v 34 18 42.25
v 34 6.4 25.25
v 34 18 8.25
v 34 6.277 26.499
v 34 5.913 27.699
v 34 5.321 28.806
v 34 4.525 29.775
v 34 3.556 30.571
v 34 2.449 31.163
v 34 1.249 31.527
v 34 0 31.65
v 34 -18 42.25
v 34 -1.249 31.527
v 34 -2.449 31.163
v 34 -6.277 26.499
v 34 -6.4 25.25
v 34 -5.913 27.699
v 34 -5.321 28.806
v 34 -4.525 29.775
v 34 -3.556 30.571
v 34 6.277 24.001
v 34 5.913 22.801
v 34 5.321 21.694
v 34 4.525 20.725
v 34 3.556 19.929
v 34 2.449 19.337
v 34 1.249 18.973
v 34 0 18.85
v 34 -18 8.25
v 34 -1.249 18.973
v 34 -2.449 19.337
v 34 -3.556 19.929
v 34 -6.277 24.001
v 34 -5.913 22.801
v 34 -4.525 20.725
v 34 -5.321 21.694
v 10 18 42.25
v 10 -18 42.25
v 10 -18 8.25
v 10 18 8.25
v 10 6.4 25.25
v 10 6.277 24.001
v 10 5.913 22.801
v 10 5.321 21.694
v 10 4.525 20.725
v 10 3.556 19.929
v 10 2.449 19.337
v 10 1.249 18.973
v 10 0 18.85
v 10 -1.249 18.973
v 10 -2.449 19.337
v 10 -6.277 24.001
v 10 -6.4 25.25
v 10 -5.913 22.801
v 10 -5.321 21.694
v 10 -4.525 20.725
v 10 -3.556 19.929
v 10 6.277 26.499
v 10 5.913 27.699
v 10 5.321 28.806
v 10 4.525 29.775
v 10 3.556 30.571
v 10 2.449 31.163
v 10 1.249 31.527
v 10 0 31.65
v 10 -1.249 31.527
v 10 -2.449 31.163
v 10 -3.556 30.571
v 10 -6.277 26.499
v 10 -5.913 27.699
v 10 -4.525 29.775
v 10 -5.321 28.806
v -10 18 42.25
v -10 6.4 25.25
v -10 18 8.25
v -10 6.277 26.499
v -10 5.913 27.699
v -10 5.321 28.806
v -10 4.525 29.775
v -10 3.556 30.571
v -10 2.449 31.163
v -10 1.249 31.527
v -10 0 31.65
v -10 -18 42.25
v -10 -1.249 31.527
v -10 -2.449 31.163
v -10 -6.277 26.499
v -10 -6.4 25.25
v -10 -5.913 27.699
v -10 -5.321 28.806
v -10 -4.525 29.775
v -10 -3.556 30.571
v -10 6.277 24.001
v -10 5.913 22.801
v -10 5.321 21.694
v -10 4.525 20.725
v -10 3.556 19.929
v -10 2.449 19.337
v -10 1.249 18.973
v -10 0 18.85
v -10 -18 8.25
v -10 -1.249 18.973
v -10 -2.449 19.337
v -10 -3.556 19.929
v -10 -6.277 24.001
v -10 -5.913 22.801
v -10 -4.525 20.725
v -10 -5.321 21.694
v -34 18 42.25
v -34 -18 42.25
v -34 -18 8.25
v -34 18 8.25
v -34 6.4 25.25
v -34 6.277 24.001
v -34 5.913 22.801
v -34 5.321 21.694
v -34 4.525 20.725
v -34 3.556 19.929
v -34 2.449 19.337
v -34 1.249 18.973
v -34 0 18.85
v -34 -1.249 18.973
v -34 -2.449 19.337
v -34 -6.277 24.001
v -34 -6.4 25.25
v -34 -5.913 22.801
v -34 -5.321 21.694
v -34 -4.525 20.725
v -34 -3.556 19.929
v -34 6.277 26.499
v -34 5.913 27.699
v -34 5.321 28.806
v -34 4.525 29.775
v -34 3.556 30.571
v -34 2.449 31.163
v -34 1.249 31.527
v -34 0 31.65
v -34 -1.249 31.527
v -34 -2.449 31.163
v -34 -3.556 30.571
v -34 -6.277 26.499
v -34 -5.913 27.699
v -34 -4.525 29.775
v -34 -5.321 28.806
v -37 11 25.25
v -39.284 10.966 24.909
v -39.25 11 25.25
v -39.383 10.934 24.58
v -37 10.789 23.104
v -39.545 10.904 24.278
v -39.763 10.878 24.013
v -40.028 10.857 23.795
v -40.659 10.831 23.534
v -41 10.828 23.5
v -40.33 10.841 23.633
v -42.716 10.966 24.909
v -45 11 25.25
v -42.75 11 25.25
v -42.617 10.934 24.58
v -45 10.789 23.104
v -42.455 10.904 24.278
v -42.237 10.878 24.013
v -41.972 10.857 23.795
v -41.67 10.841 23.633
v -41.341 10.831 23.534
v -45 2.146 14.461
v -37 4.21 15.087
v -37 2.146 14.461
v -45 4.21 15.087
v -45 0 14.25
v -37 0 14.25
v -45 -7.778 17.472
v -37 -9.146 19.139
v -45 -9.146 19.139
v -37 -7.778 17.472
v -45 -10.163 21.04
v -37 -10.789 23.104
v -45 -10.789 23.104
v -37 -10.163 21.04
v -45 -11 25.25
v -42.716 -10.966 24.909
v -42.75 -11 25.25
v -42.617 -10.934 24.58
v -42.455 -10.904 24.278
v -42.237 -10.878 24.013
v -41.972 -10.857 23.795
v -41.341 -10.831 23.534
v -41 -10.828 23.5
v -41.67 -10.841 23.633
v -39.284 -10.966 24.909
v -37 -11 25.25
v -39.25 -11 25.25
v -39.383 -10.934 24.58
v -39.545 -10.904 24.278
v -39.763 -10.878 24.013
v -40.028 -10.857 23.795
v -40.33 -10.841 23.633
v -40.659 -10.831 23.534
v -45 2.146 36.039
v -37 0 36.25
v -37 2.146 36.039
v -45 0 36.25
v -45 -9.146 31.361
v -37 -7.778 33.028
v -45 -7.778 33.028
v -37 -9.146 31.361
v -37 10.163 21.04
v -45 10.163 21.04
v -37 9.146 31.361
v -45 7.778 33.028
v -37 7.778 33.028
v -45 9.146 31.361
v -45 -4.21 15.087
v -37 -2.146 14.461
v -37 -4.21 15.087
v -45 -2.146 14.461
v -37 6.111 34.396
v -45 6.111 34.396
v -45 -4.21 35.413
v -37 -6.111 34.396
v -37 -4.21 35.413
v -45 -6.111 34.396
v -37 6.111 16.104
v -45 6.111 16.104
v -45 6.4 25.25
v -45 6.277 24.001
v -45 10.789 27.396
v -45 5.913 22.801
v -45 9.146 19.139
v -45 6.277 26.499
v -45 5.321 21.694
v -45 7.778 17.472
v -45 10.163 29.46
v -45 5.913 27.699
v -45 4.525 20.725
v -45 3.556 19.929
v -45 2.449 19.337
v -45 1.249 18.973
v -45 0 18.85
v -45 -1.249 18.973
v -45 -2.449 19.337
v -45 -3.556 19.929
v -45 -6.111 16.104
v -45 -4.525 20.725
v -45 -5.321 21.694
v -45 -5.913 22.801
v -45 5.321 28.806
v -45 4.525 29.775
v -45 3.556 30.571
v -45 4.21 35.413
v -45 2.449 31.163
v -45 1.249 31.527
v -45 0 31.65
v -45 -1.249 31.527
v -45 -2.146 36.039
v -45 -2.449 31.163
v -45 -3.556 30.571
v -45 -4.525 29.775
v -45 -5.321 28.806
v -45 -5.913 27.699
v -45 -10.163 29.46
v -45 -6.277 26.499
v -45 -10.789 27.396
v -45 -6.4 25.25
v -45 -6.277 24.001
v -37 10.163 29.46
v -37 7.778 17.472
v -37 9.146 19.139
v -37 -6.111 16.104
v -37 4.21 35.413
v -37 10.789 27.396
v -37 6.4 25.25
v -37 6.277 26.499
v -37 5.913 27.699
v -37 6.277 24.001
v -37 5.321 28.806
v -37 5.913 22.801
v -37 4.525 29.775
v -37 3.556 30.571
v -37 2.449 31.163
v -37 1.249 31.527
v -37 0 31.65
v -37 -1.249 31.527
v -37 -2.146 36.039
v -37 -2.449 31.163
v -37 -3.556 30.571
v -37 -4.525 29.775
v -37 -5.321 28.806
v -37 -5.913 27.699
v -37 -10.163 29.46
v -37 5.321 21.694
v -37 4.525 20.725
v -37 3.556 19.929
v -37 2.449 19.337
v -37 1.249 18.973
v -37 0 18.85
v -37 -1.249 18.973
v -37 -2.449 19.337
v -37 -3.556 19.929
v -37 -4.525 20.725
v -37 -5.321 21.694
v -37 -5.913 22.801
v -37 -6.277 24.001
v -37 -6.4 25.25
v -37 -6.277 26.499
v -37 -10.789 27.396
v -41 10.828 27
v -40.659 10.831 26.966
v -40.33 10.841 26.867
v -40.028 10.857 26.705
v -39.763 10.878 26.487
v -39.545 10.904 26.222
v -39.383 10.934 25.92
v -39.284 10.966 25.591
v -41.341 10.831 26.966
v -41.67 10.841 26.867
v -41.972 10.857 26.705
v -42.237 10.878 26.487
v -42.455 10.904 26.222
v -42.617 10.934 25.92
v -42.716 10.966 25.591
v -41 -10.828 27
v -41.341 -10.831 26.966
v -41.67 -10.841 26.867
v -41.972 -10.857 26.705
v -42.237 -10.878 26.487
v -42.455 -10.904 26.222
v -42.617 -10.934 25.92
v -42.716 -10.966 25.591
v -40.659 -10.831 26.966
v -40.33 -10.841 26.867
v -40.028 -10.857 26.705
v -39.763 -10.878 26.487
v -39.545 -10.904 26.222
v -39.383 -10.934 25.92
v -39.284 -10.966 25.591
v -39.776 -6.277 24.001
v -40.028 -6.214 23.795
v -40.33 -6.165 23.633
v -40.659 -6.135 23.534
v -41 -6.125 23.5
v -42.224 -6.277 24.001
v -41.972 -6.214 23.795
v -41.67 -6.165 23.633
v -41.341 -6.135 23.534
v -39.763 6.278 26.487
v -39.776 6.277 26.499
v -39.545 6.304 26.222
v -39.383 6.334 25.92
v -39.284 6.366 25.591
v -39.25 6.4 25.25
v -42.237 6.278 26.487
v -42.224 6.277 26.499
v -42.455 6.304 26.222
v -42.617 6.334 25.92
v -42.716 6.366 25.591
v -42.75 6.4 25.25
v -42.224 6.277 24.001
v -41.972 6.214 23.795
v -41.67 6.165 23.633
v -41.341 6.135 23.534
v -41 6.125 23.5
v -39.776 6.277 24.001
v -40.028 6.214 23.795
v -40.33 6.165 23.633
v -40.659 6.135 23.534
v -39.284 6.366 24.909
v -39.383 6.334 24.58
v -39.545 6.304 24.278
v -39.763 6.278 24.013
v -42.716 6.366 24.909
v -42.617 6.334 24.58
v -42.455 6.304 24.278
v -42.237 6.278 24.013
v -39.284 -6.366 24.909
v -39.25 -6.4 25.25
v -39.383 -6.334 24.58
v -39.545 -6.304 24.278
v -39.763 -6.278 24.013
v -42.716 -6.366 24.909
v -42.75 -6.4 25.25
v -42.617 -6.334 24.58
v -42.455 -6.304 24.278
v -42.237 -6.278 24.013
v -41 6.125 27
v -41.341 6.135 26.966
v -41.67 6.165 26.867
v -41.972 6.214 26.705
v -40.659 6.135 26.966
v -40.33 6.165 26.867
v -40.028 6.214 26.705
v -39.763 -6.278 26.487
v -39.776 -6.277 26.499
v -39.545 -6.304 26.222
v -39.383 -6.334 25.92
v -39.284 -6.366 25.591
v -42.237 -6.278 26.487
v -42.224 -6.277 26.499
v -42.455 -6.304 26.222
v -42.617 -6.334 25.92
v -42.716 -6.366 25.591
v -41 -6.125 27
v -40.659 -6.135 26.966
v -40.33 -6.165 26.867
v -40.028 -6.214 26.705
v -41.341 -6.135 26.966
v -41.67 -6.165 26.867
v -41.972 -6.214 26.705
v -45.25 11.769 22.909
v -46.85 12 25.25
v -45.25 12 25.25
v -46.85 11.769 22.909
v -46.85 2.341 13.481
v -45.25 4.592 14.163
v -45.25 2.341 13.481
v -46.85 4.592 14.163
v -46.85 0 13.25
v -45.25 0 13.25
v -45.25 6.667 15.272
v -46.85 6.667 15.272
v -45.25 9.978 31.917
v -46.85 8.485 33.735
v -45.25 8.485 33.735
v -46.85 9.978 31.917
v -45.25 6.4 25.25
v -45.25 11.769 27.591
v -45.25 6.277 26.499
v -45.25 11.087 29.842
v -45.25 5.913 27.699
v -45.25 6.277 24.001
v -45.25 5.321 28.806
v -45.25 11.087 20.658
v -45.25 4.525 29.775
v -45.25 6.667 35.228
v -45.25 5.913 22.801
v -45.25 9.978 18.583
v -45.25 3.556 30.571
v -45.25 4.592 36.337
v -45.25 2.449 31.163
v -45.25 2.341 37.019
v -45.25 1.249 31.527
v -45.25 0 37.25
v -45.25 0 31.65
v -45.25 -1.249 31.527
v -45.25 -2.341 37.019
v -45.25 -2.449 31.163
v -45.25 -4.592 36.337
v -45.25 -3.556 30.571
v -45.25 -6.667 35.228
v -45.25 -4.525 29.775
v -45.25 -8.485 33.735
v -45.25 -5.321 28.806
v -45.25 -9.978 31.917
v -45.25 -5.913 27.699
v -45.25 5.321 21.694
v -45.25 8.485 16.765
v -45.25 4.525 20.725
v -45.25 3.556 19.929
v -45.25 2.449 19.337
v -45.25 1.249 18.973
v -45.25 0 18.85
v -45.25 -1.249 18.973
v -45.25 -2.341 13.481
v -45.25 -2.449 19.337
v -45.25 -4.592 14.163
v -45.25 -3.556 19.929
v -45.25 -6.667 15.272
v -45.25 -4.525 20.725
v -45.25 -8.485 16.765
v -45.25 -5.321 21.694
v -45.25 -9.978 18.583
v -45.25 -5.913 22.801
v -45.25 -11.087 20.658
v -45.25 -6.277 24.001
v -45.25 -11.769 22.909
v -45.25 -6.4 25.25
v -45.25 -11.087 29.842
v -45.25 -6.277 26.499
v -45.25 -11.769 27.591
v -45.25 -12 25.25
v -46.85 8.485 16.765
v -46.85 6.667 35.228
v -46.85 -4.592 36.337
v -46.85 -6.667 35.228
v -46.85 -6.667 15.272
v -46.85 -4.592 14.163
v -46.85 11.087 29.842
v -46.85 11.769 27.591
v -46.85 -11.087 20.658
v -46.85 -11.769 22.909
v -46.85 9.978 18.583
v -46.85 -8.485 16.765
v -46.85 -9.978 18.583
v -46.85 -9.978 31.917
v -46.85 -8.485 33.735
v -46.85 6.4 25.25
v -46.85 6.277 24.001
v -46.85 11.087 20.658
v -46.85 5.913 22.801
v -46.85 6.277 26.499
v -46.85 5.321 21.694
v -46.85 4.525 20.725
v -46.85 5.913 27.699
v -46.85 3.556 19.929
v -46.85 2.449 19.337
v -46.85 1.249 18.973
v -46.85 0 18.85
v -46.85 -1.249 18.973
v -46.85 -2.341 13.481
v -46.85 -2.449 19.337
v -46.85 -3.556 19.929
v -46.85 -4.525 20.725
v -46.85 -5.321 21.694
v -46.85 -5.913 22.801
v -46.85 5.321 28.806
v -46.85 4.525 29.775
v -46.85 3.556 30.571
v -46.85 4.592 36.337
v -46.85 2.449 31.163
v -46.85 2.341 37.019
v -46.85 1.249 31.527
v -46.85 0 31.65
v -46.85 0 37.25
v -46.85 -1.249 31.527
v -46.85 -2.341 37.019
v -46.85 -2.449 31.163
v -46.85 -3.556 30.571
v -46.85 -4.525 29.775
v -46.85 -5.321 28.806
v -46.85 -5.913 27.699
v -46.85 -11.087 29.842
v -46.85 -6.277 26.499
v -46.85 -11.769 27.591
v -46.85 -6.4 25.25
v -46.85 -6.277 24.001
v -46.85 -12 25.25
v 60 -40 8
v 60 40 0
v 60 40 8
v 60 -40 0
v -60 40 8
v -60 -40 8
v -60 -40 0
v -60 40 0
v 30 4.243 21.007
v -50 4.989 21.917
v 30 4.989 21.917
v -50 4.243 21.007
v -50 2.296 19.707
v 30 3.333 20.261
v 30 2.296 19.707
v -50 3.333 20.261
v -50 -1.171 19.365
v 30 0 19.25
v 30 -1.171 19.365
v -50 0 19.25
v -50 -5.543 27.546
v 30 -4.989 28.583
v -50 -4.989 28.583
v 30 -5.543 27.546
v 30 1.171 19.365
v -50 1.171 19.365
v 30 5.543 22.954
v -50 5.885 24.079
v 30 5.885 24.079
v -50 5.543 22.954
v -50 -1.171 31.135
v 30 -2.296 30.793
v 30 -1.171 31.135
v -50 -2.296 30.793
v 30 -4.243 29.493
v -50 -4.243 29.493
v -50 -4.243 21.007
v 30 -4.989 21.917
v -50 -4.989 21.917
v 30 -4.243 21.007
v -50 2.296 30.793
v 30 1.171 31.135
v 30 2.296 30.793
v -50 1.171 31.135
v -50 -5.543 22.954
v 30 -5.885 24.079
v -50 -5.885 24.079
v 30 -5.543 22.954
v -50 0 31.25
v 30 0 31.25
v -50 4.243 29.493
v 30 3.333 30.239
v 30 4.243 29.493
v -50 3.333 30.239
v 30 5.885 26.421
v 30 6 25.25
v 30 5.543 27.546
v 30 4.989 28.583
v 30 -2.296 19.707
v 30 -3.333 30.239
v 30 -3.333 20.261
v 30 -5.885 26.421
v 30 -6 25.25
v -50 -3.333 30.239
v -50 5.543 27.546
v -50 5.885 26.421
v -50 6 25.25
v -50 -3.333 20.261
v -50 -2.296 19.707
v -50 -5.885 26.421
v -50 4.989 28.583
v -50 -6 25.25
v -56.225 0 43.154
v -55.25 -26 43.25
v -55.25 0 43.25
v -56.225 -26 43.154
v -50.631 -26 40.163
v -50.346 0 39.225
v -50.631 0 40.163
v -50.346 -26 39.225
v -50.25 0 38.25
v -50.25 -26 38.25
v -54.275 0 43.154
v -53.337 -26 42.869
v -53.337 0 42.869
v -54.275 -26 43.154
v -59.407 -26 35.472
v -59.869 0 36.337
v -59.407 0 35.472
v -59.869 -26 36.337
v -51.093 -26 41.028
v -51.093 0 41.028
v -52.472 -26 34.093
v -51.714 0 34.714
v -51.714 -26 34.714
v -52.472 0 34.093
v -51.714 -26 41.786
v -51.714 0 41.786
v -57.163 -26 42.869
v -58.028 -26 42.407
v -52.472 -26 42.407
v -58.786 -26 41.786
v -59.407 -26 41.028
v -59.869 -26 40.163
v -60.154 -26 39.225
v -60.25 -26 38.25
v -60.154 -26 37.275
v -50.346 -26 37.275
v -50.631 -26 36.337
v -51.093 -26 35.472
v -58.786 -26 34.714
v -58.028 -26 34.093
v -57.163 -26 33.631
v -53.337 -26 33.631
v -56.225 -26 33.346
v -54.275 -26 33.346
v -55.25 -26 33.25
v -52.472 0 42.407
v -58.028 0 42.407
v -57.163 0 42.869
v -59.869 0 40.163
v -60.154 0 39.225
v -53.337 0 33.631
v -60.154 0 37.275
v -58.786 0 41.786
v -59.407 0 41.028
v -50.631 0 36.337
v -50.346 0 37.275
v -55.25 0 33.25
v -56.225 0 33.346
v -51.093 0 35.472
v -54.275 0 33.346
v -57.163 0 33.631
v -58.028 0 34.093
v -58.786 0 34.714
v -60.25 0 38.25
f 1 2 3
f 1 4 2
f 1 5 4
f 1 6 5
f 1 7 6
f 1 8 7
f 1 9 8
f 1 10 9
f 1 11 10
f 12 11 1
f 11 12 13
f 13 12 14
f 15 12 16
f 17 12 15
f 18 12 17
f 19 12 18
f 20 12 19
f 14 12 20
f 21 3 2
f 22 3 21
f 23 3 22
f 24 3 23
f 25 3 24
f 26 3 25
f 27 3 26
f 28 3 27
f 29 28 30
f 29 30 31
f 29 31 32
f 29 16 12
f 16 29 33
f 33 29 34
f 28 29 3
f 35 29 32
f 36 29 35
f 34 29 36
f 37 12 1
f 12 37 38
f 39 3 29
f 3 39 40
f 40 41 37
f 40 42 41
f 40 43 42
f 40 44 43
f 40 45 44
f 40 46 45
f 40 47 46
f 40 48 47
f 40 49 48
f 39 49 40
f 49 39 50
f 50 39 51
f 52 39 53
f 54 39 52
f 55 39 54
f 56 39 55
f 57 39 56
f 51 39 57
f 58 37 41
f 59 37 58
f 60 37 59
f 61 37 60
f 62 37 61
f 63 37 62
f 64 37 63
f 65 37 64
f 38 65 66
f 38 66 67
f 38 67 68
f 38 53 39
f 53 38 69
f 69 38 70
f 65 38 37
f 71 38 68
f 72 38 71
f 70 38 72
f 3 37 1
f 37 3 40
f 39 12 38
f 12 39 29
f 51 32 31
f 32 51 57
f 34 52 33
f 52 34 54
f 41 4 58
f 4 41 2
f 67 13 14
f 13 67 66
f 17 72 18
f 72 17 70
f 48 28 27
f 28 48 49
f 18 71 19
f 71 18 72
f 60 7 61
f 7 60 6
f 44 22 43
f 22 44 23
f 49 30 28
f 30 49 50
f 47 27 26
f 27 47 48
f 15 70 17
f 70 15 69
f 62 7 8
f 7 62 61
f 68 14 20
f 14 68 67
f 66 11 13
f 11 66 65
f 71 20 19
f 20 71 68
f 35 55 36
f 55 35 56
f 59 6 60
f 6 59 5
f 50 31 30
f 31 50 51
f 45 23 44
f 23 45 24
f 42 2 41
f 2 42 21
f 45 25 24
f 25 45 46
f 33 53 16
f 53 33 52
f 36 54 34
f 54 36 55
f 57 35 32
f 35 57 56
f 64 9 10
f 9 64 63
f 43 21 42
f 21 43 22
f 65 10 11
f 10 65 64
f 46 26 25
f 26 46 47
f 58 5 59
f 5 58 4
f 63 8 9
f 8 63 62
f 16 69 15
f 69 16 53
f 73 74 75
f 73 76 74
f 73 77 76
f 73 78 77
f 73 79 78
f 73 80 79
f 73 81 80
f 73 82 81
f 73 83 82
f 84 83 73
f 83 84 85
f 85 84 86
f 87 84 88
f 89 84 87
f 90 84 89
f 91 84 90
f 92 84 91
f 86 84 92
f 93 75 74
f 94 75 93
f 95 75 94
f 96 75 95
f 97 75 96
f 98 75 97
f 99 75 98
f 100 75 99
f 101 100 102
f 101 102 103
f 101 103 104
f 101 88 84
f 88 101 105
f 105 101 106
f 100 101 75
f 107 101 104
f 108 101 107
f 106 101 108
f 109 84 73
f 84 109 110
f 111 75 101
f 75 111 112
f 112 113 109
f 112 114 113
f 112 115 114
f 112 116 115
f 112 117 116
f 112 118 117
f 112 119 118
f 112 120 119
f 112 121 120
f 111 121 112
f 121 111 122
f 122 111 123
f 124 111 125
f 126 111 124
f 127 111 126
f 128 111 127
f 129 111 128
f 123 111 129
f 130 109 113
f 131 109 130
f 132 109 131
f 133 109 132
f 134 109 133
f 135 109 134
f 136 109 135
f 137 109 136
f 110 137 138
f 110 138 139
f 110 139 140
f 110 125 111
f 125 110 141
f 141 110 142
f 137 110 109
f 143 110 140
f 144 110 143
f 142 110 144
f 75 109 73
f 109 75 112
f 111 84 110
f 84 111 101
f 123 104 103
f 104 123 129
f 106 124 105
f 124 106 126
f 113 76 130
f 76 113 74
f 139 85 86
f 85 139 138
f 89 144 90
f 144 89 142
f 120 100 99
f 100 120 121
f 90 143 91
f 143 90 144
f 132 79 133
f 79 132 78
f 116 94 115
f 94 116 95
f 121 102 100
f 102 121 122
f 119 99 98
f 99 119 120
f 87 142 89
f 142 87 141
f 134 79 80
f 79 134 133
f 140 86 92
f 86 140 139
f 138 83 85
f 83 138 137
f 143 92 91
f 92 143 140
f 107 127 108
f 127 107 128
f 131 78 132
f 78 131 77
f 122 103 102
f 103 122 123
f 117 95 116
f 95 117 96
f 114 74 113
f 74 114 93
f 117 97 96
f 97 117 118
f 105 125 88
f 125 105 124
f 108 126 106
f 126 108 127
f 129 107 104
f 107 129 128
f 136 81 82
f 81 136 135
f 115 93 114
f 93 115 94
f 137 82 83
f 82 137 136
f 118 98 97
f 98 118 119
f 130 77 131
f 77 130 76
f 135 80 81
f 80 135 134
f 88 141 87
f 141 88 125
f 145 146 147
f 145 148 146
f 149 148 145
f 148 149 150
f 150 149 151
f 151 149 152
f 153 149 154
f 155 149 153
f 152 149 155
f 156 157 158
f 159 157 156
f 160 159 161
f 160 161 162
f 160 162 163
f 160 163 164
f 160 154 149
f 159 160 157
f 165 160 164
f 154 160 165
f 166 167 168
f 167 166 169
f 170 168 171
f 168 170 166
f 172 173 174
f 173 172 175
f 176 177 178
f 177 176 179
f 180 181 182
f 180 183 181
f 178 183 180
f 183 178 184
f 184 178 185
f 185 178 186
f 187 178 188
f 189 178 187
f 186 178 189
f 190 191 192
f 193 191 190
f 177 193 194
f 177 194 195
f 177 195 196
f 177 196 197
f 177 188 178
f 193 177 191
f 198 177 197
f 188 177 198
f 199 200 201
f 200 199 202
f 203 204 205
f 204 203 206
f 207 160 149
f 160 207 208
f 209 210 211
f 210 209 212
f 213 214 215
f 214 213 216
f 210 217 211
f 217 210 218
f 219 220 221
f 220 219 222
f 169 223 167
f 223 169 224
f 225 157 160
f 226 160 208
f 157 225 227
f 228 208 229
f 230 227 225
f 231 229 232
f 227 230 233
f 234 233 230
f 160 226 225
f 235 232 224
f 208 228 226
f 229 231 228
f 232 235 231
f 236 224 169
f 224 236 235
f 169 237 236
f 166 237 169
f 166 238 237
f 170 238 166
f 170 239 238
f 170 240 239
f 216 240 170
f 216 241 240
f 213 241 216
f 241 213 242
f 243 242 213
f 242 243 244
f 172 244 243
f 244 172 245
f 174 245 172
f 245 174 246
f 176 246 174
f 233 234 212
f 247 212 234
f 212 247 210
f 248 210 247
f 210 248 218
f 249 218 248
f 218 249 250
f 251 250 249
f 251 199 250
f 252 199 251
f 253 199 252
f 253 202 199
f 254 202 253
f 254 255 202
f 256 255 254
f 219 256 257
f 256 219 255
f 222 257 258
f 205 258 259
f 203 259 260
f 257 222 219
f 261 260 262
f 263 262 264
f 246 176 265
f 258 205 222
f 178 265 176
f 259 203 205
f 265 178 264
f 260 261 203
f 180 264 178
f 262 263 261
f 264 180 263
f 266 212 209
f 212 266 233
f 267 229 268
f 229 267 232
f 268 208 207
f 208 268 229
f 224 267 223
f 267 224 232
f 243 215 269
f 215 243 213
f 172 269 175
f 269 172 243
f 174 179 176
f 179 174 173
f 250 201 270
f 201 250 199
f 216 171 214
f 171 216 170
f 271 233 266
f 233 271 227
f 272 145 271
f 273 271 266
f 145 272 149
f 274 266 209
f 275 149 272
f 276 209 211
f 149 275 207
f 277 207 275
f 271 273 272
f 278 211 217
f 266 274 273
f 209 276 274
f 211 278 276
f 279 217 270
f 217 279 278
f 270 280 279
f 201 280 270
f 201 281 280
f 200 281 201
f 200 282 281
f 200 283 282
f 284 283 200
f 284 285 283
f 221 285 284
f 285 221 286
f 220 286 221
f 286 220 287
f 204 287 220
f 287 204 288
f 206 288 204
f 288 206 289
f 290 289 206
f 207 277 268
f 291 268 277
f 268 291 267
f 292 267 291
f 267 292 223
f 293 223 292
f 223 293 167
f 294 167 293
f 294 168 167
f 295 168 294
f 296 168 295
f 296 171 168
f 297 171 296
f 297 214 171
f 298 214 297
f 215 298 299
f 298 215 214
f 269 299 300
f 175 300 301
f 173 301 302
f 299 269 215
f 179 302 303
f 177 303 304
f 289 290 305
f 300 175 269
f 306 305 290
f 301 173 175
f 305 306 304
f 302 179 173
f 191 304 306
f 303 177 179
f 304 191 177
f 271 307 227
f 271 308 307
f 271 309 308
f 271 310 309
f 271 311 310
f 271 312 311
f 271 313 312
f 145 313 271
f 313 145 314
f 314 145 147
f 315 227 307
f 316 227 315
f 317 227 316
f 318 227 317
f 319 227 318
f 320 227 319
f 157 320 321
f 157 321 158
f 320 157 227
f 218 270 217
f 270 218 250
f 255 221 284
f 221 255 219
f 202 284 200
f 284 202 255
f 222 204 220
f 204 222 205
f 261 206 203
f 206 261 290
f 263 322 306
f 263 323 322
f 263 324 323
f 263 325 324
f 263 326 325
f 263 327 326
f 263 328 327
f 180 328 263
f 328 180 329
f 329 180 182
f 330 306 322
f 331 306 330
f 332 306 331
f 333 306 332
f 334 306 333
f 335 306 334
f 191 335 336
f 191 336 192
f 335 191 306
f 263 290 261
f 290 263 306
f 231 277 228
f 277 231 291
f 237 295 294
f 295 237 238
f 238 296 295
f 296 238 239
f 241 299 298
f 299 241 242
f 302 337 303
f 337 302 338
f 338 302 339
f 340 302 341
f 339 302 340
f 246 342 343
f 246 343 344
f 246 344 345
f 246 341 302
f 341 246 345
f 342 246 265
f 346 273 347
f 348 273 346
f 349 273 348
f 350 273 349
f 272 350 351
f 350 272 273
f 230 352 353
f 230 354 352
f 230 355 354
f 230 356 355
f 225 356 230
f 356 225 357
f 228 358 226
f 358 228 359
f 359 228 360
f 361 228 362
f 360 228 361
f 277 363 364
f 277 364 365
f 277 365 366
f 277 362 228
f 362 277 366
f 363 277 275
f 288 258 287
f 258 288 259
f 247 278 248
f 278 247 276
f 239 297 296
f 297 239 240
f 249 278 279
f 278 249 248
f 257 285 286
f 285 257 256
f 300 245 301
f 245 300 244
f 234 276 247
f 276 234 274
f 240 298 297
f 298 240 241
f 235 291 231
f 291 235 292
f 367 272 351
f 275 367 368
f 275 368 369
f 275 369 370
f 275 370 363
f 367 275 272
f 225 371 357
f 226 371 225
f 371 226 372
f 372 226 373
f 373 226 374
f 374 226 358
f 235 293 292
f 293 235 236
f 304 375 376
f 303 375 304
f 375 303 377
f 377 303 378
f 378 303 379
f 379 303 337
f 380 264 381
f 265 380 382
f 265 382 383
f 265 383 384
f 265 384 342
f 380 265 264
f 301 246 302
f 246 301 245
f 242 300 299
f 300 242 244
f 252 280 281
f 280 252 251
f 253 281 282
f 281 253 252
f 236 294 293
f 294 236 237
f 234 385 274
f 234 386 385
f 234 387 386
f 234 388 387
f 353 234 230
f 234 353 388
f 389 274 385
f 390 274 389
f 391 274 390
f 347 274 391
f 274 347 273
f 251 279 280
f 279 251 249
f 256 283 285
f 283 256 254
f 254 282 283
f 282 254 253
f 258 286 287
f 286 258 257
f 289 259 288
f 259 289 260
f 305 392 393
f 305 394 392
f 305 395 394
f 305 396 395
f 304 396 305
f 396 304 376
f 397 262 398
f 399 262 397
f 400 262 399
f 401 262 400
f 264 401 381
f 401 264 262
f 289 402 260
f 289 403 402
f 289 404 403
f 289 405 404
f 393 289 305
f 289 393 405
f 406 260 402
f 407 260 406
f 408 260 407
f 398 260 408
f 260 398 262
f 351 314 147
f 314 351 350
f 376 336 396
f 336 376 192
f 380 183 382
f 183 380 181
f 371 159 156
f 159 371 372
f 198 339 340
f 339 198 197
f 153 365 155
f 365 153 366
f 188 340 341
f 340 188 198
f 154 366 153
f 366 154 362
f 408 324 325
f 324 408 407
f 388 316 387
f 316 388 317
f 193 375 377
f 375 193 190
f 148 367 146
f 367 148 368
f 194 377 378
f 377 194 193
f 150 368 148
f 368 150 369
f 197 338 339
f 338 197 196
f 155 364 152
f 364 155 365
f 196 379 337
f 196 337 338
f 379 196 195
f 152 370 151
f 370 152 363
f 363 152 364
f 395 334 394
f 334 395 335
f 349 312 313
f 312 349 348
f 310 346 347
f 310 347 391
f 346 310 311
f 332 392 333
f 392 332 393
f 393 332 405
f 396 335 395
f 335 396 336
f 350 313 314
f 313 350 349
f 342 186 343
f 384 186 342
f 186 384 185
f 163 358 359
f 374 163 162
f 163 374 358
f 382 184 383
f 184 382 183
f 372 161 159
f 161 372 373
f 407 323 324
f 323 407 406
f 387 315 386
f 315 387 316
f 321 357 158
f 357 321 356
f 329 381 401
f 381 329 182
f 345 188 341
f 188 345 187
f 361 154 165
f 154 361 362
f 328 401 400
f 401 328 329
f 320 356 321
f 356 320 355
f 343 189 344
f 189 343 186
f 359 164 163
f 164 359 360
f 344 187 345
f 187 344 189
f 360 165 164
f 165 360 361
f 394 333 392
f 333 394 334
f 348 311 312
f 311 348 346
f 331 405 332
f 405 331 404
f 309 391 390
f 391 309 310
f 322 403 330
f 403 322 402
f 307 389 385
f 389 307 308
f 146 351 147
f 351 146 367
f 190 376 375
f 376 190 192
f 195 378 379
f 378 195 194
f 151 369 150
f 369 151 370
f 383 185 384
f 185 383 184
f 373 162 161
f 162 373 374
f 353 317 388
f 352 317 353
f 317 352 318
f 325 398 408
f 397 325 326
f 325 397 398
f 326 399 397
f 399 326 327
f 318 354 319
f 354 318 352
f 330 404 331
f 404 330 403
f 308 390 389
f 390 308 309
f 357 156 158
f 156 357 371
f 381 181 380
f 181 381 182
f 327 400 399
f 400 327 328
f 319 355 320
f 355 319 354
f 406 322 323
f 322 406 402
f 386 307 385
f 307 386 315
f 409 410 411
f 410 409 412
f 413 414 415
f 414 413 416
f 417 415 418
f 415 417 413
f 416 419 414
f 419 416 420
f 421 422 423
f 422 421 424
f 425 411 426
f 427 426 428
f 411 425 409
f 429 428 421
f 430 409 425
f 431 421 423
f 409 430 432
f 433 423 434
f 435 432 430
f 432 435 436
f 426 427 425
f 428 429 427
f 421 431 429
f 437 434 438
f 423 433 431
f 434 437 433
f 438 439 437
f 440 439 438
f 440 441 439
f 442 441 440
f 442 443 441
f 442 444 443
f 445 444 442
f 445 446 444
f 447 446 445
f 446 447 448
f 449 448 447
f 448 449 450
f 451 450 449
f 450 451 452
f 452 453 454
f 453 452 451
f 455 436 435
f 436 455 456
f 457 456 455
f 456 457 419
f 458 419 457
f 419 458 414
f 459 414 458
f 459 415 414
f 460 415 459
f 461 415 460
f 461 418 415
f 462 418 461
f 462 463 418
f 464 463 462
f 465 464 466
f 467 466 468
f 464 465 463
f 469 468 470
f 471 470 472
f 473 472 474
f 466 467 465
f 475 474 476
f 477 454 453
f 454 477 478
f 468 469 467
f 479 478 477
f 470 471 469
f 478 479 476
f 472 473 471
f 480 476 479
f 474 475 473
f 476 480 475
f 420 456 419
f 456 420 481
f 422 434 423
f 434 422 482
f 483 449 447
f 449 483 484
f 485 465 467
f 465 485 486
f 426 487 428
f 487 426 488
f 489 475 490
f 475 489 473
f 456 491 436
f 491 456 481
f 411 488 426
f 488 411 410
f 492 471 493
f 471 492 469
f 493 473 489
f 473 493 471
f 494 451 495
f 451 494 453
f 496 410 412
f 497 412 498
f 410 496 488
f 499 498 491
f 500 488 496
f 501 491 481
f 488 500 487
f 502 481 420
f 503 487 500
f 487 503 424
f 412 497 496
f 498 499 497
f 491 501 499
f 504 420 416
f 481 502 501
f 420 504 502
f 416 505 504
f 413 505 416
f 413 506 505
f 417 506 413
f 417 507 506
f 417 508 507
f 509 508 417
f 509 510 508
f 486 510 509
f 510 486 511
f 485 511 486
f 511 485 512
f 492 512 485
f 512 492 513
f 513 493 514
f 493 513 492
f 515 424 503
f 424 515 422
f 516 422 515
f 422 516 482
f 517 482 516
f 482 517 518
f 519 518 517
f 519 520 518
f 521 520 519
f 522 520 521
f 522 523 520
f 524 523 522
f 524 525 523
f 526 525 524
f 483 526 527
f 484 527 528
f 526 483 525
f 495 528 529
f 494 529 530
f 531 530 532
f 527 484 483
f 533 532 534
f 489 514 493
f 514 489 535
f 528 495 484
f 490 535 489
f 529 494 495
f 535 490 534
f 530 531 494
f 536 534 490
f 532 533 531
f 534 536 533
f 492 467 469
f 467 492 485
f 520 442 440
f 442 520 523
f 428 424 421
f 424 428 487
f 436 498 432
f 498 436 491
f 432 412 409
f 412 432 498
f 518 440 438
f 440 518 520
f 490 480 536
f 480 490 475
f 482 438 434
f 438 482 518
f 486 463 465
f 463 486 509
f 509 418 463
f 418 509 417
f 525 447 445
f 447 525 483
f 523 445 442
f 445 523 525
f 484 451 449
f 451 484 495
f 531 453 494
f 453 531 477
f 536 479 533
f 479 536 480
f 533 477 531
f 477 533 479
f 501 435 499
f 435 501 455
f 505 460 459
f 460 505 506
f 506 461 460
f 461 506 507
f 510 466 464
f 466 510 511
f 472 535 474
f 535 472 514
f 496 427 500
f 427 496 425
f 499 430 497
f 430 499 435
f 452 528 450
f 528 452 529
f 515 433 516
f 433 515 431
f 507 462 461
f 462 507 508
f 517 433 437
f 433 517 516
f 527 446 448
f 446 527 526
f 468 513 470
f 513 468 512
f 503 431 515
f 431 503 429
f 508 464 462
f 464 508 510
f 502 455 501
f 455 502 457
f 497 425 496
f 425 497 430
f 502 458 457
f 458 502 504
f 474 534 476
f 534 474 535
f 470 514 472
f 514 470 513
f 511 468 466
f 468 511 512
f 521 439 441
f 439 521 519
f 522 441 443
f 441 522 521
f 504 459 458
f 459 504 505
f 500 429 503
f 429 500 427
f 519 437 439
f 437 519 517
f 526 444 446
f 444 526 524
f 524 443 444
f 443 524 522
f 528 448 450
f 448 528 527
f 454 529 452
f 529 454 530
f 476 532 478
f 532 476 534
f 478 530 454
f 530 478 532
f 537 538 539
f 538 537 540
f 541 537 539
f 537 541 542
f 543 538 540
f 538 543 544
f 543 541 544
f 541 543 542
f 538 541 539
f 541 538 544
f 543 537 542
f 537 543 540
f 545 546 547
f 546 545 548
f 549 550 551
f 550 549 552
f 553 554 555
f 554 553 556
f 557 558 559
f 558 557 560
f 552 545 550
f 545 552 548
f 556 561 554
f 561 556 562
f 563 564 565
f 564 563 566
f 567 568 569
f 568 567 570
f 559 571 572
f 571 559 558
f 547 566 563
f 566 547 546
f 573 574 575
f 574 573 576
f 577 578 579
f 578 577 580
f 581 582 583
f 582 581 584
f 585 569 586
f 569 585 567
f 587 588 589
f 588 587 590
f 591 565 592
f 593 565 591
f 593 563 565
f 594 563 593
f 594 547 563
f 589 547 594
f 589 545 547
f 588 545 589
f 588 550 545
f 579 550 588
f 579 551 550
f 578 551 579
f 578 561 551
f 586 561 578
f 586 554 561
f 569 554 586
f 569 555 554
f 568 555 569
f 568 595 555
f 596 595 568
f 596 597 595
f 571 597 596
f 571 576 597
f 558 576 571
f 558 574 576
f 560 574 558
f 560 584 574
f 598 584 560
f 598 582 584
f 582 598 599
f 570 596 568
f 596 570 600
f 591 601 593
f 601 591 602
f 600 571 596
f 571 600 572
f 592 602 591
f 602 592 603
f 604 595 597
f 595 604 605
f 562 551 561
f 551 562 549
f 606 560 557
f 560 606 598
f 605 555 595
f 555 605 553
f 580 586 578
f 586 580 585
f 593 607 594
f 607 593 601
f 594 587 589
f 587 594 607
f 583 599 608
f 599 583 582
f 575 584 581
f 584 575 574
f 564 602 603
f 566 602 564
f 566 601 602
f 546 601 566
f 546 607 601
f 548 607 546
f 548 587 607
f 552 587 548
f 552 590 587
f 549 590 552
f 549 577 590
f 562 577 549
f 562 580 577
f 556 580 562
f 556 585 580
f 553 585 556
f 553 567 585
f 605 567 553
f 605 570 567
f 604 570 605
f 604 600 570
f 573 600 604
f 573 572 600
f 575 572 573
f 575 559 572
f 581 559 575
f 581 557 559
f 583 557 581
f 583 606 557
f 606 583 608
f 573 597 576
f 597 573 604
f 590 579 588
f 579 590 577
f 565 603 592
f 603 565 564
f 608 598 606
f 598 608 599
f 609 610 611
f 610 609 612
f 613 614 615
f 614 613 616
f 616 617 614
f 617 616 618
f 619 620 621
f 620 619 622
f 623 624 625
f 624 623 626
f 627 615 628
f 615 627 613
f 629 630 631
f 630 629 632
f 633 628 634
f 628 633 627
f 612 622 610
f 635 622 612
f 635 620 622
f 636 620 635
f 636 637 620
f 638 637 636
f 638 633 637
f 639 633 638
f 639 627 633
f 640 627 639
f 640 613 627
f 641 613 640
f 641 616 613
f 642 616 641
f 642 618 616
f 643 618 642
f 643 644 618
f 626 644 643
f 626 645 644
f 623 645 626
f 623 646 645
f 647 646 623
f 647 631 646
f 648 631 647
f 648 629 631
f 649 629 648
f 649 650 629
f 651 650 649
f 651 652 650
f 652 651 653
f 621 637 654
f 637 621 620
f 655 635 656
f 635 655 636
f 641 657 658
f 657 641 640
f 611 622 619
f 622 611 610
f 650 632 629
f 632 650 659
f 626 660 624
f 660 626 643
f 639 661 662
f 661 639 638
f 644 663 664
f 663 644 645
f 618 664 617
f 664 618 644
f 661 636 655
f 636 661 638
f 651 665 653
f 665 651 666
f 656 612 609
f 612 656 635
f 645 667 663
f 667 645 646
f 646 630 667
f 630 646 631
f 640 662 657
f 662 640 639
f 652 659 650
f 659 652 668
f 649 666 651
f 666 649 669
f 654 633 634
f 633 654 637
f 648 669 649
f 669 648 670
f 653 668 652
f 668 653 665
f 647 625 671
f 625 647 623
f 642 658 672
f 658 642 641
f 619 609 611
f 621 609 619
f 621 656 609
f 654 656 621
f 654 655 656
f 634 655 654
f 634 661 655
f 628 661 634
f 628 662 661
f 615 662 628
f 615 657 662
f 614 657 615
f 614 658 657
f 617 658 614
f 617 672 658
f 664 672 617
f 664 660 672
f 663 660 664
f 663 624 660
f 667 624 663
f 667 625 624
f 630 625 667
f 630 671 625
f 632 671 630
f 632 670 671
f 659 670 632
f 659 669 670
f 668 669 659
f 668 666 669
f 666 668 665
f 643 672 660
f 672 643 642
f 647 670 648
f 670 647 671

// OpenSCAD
$fn = 32;

// ------------------------------------------------------------------------
// Machine vise: screw d12, jaws 24 x 34 mm
// Every part is its own module, assembly() places every instance.
// ------------------------------------------------------------------------

// --- part 1 ---
module vise_bed() {
  difference() {
    translate([-60, -40, 0]) cube([120, 80, 8]);
  }
}

// --- part 2 ---
module vise_jaw() {
  difference() {
    translate([-12, -18, 0]) cube([24, 36, 34]);
    translate([0, 0, 17]) rotate([0, 90, 0]) cylinder(h = 26, d = 12.8, center = true);
  }
}

// --- part 3 ---
module vise_screw() {
  translate([0, 0, -40]) cylinder(h = 80, d = 12);
}

// --- part 4 ---
module screw_collar() {
  difference() {
    cylinder(h = 8, d = 22);
    translate([0, 0, -1]) cylinder(h = 10, d = 12.8);
    translate([0, 0, 4]) rotate([90, 0, 0]) cylinder(h = 24, d = 3.5, center = true);
  }
}

// --- part 5 ---
module screw_washer() {
  difference() {
      translate([0, 0, 0]) cylinder(h = 1.6, d = 24);
      translate([0, 0, -1]) cylinder(h = 3.6, d = 12.8);
    }
}

// --- part 6 ---
module vise_handle() {
  cylinder(h = 26, d = 10);
}

// --- assembly ---
module assembly() {
  color([0.80, 0.24, 0.20]) translate([0, 0, 0]) rotate([0, 0, 0]) vise_bed();
  color([0.20, 0.45, 0.75]) translate([22, 0, 8.25]) rotate([0, 0, 0]) vise_jaw();
  color([0.25, 0.62, 0.32]) translate([-22, 0, 8.25]) rotate([0, 0, 0]) vise_jaw();
  color([0.92, 0.70, 0.18]) translate([-10, 0, 25.25]) rotate([0, 90, 0]) vise_screw();
  color([0.58, 0.35, 0.70]) translate([-45, 0, 25.25]) rotate([0, 90, 0]) screw_collar();
  color([0.16, 0.66, 0.66]) translate([-46.85, 0, 25.25]) rotate([0, 90, 0]) screw_washer();
  color([0.85, 0.48, 0.18]) translate([-55.25, 0, 38.25]) rotate([90, 0, 0]) vise_handle();
}

assembly();
